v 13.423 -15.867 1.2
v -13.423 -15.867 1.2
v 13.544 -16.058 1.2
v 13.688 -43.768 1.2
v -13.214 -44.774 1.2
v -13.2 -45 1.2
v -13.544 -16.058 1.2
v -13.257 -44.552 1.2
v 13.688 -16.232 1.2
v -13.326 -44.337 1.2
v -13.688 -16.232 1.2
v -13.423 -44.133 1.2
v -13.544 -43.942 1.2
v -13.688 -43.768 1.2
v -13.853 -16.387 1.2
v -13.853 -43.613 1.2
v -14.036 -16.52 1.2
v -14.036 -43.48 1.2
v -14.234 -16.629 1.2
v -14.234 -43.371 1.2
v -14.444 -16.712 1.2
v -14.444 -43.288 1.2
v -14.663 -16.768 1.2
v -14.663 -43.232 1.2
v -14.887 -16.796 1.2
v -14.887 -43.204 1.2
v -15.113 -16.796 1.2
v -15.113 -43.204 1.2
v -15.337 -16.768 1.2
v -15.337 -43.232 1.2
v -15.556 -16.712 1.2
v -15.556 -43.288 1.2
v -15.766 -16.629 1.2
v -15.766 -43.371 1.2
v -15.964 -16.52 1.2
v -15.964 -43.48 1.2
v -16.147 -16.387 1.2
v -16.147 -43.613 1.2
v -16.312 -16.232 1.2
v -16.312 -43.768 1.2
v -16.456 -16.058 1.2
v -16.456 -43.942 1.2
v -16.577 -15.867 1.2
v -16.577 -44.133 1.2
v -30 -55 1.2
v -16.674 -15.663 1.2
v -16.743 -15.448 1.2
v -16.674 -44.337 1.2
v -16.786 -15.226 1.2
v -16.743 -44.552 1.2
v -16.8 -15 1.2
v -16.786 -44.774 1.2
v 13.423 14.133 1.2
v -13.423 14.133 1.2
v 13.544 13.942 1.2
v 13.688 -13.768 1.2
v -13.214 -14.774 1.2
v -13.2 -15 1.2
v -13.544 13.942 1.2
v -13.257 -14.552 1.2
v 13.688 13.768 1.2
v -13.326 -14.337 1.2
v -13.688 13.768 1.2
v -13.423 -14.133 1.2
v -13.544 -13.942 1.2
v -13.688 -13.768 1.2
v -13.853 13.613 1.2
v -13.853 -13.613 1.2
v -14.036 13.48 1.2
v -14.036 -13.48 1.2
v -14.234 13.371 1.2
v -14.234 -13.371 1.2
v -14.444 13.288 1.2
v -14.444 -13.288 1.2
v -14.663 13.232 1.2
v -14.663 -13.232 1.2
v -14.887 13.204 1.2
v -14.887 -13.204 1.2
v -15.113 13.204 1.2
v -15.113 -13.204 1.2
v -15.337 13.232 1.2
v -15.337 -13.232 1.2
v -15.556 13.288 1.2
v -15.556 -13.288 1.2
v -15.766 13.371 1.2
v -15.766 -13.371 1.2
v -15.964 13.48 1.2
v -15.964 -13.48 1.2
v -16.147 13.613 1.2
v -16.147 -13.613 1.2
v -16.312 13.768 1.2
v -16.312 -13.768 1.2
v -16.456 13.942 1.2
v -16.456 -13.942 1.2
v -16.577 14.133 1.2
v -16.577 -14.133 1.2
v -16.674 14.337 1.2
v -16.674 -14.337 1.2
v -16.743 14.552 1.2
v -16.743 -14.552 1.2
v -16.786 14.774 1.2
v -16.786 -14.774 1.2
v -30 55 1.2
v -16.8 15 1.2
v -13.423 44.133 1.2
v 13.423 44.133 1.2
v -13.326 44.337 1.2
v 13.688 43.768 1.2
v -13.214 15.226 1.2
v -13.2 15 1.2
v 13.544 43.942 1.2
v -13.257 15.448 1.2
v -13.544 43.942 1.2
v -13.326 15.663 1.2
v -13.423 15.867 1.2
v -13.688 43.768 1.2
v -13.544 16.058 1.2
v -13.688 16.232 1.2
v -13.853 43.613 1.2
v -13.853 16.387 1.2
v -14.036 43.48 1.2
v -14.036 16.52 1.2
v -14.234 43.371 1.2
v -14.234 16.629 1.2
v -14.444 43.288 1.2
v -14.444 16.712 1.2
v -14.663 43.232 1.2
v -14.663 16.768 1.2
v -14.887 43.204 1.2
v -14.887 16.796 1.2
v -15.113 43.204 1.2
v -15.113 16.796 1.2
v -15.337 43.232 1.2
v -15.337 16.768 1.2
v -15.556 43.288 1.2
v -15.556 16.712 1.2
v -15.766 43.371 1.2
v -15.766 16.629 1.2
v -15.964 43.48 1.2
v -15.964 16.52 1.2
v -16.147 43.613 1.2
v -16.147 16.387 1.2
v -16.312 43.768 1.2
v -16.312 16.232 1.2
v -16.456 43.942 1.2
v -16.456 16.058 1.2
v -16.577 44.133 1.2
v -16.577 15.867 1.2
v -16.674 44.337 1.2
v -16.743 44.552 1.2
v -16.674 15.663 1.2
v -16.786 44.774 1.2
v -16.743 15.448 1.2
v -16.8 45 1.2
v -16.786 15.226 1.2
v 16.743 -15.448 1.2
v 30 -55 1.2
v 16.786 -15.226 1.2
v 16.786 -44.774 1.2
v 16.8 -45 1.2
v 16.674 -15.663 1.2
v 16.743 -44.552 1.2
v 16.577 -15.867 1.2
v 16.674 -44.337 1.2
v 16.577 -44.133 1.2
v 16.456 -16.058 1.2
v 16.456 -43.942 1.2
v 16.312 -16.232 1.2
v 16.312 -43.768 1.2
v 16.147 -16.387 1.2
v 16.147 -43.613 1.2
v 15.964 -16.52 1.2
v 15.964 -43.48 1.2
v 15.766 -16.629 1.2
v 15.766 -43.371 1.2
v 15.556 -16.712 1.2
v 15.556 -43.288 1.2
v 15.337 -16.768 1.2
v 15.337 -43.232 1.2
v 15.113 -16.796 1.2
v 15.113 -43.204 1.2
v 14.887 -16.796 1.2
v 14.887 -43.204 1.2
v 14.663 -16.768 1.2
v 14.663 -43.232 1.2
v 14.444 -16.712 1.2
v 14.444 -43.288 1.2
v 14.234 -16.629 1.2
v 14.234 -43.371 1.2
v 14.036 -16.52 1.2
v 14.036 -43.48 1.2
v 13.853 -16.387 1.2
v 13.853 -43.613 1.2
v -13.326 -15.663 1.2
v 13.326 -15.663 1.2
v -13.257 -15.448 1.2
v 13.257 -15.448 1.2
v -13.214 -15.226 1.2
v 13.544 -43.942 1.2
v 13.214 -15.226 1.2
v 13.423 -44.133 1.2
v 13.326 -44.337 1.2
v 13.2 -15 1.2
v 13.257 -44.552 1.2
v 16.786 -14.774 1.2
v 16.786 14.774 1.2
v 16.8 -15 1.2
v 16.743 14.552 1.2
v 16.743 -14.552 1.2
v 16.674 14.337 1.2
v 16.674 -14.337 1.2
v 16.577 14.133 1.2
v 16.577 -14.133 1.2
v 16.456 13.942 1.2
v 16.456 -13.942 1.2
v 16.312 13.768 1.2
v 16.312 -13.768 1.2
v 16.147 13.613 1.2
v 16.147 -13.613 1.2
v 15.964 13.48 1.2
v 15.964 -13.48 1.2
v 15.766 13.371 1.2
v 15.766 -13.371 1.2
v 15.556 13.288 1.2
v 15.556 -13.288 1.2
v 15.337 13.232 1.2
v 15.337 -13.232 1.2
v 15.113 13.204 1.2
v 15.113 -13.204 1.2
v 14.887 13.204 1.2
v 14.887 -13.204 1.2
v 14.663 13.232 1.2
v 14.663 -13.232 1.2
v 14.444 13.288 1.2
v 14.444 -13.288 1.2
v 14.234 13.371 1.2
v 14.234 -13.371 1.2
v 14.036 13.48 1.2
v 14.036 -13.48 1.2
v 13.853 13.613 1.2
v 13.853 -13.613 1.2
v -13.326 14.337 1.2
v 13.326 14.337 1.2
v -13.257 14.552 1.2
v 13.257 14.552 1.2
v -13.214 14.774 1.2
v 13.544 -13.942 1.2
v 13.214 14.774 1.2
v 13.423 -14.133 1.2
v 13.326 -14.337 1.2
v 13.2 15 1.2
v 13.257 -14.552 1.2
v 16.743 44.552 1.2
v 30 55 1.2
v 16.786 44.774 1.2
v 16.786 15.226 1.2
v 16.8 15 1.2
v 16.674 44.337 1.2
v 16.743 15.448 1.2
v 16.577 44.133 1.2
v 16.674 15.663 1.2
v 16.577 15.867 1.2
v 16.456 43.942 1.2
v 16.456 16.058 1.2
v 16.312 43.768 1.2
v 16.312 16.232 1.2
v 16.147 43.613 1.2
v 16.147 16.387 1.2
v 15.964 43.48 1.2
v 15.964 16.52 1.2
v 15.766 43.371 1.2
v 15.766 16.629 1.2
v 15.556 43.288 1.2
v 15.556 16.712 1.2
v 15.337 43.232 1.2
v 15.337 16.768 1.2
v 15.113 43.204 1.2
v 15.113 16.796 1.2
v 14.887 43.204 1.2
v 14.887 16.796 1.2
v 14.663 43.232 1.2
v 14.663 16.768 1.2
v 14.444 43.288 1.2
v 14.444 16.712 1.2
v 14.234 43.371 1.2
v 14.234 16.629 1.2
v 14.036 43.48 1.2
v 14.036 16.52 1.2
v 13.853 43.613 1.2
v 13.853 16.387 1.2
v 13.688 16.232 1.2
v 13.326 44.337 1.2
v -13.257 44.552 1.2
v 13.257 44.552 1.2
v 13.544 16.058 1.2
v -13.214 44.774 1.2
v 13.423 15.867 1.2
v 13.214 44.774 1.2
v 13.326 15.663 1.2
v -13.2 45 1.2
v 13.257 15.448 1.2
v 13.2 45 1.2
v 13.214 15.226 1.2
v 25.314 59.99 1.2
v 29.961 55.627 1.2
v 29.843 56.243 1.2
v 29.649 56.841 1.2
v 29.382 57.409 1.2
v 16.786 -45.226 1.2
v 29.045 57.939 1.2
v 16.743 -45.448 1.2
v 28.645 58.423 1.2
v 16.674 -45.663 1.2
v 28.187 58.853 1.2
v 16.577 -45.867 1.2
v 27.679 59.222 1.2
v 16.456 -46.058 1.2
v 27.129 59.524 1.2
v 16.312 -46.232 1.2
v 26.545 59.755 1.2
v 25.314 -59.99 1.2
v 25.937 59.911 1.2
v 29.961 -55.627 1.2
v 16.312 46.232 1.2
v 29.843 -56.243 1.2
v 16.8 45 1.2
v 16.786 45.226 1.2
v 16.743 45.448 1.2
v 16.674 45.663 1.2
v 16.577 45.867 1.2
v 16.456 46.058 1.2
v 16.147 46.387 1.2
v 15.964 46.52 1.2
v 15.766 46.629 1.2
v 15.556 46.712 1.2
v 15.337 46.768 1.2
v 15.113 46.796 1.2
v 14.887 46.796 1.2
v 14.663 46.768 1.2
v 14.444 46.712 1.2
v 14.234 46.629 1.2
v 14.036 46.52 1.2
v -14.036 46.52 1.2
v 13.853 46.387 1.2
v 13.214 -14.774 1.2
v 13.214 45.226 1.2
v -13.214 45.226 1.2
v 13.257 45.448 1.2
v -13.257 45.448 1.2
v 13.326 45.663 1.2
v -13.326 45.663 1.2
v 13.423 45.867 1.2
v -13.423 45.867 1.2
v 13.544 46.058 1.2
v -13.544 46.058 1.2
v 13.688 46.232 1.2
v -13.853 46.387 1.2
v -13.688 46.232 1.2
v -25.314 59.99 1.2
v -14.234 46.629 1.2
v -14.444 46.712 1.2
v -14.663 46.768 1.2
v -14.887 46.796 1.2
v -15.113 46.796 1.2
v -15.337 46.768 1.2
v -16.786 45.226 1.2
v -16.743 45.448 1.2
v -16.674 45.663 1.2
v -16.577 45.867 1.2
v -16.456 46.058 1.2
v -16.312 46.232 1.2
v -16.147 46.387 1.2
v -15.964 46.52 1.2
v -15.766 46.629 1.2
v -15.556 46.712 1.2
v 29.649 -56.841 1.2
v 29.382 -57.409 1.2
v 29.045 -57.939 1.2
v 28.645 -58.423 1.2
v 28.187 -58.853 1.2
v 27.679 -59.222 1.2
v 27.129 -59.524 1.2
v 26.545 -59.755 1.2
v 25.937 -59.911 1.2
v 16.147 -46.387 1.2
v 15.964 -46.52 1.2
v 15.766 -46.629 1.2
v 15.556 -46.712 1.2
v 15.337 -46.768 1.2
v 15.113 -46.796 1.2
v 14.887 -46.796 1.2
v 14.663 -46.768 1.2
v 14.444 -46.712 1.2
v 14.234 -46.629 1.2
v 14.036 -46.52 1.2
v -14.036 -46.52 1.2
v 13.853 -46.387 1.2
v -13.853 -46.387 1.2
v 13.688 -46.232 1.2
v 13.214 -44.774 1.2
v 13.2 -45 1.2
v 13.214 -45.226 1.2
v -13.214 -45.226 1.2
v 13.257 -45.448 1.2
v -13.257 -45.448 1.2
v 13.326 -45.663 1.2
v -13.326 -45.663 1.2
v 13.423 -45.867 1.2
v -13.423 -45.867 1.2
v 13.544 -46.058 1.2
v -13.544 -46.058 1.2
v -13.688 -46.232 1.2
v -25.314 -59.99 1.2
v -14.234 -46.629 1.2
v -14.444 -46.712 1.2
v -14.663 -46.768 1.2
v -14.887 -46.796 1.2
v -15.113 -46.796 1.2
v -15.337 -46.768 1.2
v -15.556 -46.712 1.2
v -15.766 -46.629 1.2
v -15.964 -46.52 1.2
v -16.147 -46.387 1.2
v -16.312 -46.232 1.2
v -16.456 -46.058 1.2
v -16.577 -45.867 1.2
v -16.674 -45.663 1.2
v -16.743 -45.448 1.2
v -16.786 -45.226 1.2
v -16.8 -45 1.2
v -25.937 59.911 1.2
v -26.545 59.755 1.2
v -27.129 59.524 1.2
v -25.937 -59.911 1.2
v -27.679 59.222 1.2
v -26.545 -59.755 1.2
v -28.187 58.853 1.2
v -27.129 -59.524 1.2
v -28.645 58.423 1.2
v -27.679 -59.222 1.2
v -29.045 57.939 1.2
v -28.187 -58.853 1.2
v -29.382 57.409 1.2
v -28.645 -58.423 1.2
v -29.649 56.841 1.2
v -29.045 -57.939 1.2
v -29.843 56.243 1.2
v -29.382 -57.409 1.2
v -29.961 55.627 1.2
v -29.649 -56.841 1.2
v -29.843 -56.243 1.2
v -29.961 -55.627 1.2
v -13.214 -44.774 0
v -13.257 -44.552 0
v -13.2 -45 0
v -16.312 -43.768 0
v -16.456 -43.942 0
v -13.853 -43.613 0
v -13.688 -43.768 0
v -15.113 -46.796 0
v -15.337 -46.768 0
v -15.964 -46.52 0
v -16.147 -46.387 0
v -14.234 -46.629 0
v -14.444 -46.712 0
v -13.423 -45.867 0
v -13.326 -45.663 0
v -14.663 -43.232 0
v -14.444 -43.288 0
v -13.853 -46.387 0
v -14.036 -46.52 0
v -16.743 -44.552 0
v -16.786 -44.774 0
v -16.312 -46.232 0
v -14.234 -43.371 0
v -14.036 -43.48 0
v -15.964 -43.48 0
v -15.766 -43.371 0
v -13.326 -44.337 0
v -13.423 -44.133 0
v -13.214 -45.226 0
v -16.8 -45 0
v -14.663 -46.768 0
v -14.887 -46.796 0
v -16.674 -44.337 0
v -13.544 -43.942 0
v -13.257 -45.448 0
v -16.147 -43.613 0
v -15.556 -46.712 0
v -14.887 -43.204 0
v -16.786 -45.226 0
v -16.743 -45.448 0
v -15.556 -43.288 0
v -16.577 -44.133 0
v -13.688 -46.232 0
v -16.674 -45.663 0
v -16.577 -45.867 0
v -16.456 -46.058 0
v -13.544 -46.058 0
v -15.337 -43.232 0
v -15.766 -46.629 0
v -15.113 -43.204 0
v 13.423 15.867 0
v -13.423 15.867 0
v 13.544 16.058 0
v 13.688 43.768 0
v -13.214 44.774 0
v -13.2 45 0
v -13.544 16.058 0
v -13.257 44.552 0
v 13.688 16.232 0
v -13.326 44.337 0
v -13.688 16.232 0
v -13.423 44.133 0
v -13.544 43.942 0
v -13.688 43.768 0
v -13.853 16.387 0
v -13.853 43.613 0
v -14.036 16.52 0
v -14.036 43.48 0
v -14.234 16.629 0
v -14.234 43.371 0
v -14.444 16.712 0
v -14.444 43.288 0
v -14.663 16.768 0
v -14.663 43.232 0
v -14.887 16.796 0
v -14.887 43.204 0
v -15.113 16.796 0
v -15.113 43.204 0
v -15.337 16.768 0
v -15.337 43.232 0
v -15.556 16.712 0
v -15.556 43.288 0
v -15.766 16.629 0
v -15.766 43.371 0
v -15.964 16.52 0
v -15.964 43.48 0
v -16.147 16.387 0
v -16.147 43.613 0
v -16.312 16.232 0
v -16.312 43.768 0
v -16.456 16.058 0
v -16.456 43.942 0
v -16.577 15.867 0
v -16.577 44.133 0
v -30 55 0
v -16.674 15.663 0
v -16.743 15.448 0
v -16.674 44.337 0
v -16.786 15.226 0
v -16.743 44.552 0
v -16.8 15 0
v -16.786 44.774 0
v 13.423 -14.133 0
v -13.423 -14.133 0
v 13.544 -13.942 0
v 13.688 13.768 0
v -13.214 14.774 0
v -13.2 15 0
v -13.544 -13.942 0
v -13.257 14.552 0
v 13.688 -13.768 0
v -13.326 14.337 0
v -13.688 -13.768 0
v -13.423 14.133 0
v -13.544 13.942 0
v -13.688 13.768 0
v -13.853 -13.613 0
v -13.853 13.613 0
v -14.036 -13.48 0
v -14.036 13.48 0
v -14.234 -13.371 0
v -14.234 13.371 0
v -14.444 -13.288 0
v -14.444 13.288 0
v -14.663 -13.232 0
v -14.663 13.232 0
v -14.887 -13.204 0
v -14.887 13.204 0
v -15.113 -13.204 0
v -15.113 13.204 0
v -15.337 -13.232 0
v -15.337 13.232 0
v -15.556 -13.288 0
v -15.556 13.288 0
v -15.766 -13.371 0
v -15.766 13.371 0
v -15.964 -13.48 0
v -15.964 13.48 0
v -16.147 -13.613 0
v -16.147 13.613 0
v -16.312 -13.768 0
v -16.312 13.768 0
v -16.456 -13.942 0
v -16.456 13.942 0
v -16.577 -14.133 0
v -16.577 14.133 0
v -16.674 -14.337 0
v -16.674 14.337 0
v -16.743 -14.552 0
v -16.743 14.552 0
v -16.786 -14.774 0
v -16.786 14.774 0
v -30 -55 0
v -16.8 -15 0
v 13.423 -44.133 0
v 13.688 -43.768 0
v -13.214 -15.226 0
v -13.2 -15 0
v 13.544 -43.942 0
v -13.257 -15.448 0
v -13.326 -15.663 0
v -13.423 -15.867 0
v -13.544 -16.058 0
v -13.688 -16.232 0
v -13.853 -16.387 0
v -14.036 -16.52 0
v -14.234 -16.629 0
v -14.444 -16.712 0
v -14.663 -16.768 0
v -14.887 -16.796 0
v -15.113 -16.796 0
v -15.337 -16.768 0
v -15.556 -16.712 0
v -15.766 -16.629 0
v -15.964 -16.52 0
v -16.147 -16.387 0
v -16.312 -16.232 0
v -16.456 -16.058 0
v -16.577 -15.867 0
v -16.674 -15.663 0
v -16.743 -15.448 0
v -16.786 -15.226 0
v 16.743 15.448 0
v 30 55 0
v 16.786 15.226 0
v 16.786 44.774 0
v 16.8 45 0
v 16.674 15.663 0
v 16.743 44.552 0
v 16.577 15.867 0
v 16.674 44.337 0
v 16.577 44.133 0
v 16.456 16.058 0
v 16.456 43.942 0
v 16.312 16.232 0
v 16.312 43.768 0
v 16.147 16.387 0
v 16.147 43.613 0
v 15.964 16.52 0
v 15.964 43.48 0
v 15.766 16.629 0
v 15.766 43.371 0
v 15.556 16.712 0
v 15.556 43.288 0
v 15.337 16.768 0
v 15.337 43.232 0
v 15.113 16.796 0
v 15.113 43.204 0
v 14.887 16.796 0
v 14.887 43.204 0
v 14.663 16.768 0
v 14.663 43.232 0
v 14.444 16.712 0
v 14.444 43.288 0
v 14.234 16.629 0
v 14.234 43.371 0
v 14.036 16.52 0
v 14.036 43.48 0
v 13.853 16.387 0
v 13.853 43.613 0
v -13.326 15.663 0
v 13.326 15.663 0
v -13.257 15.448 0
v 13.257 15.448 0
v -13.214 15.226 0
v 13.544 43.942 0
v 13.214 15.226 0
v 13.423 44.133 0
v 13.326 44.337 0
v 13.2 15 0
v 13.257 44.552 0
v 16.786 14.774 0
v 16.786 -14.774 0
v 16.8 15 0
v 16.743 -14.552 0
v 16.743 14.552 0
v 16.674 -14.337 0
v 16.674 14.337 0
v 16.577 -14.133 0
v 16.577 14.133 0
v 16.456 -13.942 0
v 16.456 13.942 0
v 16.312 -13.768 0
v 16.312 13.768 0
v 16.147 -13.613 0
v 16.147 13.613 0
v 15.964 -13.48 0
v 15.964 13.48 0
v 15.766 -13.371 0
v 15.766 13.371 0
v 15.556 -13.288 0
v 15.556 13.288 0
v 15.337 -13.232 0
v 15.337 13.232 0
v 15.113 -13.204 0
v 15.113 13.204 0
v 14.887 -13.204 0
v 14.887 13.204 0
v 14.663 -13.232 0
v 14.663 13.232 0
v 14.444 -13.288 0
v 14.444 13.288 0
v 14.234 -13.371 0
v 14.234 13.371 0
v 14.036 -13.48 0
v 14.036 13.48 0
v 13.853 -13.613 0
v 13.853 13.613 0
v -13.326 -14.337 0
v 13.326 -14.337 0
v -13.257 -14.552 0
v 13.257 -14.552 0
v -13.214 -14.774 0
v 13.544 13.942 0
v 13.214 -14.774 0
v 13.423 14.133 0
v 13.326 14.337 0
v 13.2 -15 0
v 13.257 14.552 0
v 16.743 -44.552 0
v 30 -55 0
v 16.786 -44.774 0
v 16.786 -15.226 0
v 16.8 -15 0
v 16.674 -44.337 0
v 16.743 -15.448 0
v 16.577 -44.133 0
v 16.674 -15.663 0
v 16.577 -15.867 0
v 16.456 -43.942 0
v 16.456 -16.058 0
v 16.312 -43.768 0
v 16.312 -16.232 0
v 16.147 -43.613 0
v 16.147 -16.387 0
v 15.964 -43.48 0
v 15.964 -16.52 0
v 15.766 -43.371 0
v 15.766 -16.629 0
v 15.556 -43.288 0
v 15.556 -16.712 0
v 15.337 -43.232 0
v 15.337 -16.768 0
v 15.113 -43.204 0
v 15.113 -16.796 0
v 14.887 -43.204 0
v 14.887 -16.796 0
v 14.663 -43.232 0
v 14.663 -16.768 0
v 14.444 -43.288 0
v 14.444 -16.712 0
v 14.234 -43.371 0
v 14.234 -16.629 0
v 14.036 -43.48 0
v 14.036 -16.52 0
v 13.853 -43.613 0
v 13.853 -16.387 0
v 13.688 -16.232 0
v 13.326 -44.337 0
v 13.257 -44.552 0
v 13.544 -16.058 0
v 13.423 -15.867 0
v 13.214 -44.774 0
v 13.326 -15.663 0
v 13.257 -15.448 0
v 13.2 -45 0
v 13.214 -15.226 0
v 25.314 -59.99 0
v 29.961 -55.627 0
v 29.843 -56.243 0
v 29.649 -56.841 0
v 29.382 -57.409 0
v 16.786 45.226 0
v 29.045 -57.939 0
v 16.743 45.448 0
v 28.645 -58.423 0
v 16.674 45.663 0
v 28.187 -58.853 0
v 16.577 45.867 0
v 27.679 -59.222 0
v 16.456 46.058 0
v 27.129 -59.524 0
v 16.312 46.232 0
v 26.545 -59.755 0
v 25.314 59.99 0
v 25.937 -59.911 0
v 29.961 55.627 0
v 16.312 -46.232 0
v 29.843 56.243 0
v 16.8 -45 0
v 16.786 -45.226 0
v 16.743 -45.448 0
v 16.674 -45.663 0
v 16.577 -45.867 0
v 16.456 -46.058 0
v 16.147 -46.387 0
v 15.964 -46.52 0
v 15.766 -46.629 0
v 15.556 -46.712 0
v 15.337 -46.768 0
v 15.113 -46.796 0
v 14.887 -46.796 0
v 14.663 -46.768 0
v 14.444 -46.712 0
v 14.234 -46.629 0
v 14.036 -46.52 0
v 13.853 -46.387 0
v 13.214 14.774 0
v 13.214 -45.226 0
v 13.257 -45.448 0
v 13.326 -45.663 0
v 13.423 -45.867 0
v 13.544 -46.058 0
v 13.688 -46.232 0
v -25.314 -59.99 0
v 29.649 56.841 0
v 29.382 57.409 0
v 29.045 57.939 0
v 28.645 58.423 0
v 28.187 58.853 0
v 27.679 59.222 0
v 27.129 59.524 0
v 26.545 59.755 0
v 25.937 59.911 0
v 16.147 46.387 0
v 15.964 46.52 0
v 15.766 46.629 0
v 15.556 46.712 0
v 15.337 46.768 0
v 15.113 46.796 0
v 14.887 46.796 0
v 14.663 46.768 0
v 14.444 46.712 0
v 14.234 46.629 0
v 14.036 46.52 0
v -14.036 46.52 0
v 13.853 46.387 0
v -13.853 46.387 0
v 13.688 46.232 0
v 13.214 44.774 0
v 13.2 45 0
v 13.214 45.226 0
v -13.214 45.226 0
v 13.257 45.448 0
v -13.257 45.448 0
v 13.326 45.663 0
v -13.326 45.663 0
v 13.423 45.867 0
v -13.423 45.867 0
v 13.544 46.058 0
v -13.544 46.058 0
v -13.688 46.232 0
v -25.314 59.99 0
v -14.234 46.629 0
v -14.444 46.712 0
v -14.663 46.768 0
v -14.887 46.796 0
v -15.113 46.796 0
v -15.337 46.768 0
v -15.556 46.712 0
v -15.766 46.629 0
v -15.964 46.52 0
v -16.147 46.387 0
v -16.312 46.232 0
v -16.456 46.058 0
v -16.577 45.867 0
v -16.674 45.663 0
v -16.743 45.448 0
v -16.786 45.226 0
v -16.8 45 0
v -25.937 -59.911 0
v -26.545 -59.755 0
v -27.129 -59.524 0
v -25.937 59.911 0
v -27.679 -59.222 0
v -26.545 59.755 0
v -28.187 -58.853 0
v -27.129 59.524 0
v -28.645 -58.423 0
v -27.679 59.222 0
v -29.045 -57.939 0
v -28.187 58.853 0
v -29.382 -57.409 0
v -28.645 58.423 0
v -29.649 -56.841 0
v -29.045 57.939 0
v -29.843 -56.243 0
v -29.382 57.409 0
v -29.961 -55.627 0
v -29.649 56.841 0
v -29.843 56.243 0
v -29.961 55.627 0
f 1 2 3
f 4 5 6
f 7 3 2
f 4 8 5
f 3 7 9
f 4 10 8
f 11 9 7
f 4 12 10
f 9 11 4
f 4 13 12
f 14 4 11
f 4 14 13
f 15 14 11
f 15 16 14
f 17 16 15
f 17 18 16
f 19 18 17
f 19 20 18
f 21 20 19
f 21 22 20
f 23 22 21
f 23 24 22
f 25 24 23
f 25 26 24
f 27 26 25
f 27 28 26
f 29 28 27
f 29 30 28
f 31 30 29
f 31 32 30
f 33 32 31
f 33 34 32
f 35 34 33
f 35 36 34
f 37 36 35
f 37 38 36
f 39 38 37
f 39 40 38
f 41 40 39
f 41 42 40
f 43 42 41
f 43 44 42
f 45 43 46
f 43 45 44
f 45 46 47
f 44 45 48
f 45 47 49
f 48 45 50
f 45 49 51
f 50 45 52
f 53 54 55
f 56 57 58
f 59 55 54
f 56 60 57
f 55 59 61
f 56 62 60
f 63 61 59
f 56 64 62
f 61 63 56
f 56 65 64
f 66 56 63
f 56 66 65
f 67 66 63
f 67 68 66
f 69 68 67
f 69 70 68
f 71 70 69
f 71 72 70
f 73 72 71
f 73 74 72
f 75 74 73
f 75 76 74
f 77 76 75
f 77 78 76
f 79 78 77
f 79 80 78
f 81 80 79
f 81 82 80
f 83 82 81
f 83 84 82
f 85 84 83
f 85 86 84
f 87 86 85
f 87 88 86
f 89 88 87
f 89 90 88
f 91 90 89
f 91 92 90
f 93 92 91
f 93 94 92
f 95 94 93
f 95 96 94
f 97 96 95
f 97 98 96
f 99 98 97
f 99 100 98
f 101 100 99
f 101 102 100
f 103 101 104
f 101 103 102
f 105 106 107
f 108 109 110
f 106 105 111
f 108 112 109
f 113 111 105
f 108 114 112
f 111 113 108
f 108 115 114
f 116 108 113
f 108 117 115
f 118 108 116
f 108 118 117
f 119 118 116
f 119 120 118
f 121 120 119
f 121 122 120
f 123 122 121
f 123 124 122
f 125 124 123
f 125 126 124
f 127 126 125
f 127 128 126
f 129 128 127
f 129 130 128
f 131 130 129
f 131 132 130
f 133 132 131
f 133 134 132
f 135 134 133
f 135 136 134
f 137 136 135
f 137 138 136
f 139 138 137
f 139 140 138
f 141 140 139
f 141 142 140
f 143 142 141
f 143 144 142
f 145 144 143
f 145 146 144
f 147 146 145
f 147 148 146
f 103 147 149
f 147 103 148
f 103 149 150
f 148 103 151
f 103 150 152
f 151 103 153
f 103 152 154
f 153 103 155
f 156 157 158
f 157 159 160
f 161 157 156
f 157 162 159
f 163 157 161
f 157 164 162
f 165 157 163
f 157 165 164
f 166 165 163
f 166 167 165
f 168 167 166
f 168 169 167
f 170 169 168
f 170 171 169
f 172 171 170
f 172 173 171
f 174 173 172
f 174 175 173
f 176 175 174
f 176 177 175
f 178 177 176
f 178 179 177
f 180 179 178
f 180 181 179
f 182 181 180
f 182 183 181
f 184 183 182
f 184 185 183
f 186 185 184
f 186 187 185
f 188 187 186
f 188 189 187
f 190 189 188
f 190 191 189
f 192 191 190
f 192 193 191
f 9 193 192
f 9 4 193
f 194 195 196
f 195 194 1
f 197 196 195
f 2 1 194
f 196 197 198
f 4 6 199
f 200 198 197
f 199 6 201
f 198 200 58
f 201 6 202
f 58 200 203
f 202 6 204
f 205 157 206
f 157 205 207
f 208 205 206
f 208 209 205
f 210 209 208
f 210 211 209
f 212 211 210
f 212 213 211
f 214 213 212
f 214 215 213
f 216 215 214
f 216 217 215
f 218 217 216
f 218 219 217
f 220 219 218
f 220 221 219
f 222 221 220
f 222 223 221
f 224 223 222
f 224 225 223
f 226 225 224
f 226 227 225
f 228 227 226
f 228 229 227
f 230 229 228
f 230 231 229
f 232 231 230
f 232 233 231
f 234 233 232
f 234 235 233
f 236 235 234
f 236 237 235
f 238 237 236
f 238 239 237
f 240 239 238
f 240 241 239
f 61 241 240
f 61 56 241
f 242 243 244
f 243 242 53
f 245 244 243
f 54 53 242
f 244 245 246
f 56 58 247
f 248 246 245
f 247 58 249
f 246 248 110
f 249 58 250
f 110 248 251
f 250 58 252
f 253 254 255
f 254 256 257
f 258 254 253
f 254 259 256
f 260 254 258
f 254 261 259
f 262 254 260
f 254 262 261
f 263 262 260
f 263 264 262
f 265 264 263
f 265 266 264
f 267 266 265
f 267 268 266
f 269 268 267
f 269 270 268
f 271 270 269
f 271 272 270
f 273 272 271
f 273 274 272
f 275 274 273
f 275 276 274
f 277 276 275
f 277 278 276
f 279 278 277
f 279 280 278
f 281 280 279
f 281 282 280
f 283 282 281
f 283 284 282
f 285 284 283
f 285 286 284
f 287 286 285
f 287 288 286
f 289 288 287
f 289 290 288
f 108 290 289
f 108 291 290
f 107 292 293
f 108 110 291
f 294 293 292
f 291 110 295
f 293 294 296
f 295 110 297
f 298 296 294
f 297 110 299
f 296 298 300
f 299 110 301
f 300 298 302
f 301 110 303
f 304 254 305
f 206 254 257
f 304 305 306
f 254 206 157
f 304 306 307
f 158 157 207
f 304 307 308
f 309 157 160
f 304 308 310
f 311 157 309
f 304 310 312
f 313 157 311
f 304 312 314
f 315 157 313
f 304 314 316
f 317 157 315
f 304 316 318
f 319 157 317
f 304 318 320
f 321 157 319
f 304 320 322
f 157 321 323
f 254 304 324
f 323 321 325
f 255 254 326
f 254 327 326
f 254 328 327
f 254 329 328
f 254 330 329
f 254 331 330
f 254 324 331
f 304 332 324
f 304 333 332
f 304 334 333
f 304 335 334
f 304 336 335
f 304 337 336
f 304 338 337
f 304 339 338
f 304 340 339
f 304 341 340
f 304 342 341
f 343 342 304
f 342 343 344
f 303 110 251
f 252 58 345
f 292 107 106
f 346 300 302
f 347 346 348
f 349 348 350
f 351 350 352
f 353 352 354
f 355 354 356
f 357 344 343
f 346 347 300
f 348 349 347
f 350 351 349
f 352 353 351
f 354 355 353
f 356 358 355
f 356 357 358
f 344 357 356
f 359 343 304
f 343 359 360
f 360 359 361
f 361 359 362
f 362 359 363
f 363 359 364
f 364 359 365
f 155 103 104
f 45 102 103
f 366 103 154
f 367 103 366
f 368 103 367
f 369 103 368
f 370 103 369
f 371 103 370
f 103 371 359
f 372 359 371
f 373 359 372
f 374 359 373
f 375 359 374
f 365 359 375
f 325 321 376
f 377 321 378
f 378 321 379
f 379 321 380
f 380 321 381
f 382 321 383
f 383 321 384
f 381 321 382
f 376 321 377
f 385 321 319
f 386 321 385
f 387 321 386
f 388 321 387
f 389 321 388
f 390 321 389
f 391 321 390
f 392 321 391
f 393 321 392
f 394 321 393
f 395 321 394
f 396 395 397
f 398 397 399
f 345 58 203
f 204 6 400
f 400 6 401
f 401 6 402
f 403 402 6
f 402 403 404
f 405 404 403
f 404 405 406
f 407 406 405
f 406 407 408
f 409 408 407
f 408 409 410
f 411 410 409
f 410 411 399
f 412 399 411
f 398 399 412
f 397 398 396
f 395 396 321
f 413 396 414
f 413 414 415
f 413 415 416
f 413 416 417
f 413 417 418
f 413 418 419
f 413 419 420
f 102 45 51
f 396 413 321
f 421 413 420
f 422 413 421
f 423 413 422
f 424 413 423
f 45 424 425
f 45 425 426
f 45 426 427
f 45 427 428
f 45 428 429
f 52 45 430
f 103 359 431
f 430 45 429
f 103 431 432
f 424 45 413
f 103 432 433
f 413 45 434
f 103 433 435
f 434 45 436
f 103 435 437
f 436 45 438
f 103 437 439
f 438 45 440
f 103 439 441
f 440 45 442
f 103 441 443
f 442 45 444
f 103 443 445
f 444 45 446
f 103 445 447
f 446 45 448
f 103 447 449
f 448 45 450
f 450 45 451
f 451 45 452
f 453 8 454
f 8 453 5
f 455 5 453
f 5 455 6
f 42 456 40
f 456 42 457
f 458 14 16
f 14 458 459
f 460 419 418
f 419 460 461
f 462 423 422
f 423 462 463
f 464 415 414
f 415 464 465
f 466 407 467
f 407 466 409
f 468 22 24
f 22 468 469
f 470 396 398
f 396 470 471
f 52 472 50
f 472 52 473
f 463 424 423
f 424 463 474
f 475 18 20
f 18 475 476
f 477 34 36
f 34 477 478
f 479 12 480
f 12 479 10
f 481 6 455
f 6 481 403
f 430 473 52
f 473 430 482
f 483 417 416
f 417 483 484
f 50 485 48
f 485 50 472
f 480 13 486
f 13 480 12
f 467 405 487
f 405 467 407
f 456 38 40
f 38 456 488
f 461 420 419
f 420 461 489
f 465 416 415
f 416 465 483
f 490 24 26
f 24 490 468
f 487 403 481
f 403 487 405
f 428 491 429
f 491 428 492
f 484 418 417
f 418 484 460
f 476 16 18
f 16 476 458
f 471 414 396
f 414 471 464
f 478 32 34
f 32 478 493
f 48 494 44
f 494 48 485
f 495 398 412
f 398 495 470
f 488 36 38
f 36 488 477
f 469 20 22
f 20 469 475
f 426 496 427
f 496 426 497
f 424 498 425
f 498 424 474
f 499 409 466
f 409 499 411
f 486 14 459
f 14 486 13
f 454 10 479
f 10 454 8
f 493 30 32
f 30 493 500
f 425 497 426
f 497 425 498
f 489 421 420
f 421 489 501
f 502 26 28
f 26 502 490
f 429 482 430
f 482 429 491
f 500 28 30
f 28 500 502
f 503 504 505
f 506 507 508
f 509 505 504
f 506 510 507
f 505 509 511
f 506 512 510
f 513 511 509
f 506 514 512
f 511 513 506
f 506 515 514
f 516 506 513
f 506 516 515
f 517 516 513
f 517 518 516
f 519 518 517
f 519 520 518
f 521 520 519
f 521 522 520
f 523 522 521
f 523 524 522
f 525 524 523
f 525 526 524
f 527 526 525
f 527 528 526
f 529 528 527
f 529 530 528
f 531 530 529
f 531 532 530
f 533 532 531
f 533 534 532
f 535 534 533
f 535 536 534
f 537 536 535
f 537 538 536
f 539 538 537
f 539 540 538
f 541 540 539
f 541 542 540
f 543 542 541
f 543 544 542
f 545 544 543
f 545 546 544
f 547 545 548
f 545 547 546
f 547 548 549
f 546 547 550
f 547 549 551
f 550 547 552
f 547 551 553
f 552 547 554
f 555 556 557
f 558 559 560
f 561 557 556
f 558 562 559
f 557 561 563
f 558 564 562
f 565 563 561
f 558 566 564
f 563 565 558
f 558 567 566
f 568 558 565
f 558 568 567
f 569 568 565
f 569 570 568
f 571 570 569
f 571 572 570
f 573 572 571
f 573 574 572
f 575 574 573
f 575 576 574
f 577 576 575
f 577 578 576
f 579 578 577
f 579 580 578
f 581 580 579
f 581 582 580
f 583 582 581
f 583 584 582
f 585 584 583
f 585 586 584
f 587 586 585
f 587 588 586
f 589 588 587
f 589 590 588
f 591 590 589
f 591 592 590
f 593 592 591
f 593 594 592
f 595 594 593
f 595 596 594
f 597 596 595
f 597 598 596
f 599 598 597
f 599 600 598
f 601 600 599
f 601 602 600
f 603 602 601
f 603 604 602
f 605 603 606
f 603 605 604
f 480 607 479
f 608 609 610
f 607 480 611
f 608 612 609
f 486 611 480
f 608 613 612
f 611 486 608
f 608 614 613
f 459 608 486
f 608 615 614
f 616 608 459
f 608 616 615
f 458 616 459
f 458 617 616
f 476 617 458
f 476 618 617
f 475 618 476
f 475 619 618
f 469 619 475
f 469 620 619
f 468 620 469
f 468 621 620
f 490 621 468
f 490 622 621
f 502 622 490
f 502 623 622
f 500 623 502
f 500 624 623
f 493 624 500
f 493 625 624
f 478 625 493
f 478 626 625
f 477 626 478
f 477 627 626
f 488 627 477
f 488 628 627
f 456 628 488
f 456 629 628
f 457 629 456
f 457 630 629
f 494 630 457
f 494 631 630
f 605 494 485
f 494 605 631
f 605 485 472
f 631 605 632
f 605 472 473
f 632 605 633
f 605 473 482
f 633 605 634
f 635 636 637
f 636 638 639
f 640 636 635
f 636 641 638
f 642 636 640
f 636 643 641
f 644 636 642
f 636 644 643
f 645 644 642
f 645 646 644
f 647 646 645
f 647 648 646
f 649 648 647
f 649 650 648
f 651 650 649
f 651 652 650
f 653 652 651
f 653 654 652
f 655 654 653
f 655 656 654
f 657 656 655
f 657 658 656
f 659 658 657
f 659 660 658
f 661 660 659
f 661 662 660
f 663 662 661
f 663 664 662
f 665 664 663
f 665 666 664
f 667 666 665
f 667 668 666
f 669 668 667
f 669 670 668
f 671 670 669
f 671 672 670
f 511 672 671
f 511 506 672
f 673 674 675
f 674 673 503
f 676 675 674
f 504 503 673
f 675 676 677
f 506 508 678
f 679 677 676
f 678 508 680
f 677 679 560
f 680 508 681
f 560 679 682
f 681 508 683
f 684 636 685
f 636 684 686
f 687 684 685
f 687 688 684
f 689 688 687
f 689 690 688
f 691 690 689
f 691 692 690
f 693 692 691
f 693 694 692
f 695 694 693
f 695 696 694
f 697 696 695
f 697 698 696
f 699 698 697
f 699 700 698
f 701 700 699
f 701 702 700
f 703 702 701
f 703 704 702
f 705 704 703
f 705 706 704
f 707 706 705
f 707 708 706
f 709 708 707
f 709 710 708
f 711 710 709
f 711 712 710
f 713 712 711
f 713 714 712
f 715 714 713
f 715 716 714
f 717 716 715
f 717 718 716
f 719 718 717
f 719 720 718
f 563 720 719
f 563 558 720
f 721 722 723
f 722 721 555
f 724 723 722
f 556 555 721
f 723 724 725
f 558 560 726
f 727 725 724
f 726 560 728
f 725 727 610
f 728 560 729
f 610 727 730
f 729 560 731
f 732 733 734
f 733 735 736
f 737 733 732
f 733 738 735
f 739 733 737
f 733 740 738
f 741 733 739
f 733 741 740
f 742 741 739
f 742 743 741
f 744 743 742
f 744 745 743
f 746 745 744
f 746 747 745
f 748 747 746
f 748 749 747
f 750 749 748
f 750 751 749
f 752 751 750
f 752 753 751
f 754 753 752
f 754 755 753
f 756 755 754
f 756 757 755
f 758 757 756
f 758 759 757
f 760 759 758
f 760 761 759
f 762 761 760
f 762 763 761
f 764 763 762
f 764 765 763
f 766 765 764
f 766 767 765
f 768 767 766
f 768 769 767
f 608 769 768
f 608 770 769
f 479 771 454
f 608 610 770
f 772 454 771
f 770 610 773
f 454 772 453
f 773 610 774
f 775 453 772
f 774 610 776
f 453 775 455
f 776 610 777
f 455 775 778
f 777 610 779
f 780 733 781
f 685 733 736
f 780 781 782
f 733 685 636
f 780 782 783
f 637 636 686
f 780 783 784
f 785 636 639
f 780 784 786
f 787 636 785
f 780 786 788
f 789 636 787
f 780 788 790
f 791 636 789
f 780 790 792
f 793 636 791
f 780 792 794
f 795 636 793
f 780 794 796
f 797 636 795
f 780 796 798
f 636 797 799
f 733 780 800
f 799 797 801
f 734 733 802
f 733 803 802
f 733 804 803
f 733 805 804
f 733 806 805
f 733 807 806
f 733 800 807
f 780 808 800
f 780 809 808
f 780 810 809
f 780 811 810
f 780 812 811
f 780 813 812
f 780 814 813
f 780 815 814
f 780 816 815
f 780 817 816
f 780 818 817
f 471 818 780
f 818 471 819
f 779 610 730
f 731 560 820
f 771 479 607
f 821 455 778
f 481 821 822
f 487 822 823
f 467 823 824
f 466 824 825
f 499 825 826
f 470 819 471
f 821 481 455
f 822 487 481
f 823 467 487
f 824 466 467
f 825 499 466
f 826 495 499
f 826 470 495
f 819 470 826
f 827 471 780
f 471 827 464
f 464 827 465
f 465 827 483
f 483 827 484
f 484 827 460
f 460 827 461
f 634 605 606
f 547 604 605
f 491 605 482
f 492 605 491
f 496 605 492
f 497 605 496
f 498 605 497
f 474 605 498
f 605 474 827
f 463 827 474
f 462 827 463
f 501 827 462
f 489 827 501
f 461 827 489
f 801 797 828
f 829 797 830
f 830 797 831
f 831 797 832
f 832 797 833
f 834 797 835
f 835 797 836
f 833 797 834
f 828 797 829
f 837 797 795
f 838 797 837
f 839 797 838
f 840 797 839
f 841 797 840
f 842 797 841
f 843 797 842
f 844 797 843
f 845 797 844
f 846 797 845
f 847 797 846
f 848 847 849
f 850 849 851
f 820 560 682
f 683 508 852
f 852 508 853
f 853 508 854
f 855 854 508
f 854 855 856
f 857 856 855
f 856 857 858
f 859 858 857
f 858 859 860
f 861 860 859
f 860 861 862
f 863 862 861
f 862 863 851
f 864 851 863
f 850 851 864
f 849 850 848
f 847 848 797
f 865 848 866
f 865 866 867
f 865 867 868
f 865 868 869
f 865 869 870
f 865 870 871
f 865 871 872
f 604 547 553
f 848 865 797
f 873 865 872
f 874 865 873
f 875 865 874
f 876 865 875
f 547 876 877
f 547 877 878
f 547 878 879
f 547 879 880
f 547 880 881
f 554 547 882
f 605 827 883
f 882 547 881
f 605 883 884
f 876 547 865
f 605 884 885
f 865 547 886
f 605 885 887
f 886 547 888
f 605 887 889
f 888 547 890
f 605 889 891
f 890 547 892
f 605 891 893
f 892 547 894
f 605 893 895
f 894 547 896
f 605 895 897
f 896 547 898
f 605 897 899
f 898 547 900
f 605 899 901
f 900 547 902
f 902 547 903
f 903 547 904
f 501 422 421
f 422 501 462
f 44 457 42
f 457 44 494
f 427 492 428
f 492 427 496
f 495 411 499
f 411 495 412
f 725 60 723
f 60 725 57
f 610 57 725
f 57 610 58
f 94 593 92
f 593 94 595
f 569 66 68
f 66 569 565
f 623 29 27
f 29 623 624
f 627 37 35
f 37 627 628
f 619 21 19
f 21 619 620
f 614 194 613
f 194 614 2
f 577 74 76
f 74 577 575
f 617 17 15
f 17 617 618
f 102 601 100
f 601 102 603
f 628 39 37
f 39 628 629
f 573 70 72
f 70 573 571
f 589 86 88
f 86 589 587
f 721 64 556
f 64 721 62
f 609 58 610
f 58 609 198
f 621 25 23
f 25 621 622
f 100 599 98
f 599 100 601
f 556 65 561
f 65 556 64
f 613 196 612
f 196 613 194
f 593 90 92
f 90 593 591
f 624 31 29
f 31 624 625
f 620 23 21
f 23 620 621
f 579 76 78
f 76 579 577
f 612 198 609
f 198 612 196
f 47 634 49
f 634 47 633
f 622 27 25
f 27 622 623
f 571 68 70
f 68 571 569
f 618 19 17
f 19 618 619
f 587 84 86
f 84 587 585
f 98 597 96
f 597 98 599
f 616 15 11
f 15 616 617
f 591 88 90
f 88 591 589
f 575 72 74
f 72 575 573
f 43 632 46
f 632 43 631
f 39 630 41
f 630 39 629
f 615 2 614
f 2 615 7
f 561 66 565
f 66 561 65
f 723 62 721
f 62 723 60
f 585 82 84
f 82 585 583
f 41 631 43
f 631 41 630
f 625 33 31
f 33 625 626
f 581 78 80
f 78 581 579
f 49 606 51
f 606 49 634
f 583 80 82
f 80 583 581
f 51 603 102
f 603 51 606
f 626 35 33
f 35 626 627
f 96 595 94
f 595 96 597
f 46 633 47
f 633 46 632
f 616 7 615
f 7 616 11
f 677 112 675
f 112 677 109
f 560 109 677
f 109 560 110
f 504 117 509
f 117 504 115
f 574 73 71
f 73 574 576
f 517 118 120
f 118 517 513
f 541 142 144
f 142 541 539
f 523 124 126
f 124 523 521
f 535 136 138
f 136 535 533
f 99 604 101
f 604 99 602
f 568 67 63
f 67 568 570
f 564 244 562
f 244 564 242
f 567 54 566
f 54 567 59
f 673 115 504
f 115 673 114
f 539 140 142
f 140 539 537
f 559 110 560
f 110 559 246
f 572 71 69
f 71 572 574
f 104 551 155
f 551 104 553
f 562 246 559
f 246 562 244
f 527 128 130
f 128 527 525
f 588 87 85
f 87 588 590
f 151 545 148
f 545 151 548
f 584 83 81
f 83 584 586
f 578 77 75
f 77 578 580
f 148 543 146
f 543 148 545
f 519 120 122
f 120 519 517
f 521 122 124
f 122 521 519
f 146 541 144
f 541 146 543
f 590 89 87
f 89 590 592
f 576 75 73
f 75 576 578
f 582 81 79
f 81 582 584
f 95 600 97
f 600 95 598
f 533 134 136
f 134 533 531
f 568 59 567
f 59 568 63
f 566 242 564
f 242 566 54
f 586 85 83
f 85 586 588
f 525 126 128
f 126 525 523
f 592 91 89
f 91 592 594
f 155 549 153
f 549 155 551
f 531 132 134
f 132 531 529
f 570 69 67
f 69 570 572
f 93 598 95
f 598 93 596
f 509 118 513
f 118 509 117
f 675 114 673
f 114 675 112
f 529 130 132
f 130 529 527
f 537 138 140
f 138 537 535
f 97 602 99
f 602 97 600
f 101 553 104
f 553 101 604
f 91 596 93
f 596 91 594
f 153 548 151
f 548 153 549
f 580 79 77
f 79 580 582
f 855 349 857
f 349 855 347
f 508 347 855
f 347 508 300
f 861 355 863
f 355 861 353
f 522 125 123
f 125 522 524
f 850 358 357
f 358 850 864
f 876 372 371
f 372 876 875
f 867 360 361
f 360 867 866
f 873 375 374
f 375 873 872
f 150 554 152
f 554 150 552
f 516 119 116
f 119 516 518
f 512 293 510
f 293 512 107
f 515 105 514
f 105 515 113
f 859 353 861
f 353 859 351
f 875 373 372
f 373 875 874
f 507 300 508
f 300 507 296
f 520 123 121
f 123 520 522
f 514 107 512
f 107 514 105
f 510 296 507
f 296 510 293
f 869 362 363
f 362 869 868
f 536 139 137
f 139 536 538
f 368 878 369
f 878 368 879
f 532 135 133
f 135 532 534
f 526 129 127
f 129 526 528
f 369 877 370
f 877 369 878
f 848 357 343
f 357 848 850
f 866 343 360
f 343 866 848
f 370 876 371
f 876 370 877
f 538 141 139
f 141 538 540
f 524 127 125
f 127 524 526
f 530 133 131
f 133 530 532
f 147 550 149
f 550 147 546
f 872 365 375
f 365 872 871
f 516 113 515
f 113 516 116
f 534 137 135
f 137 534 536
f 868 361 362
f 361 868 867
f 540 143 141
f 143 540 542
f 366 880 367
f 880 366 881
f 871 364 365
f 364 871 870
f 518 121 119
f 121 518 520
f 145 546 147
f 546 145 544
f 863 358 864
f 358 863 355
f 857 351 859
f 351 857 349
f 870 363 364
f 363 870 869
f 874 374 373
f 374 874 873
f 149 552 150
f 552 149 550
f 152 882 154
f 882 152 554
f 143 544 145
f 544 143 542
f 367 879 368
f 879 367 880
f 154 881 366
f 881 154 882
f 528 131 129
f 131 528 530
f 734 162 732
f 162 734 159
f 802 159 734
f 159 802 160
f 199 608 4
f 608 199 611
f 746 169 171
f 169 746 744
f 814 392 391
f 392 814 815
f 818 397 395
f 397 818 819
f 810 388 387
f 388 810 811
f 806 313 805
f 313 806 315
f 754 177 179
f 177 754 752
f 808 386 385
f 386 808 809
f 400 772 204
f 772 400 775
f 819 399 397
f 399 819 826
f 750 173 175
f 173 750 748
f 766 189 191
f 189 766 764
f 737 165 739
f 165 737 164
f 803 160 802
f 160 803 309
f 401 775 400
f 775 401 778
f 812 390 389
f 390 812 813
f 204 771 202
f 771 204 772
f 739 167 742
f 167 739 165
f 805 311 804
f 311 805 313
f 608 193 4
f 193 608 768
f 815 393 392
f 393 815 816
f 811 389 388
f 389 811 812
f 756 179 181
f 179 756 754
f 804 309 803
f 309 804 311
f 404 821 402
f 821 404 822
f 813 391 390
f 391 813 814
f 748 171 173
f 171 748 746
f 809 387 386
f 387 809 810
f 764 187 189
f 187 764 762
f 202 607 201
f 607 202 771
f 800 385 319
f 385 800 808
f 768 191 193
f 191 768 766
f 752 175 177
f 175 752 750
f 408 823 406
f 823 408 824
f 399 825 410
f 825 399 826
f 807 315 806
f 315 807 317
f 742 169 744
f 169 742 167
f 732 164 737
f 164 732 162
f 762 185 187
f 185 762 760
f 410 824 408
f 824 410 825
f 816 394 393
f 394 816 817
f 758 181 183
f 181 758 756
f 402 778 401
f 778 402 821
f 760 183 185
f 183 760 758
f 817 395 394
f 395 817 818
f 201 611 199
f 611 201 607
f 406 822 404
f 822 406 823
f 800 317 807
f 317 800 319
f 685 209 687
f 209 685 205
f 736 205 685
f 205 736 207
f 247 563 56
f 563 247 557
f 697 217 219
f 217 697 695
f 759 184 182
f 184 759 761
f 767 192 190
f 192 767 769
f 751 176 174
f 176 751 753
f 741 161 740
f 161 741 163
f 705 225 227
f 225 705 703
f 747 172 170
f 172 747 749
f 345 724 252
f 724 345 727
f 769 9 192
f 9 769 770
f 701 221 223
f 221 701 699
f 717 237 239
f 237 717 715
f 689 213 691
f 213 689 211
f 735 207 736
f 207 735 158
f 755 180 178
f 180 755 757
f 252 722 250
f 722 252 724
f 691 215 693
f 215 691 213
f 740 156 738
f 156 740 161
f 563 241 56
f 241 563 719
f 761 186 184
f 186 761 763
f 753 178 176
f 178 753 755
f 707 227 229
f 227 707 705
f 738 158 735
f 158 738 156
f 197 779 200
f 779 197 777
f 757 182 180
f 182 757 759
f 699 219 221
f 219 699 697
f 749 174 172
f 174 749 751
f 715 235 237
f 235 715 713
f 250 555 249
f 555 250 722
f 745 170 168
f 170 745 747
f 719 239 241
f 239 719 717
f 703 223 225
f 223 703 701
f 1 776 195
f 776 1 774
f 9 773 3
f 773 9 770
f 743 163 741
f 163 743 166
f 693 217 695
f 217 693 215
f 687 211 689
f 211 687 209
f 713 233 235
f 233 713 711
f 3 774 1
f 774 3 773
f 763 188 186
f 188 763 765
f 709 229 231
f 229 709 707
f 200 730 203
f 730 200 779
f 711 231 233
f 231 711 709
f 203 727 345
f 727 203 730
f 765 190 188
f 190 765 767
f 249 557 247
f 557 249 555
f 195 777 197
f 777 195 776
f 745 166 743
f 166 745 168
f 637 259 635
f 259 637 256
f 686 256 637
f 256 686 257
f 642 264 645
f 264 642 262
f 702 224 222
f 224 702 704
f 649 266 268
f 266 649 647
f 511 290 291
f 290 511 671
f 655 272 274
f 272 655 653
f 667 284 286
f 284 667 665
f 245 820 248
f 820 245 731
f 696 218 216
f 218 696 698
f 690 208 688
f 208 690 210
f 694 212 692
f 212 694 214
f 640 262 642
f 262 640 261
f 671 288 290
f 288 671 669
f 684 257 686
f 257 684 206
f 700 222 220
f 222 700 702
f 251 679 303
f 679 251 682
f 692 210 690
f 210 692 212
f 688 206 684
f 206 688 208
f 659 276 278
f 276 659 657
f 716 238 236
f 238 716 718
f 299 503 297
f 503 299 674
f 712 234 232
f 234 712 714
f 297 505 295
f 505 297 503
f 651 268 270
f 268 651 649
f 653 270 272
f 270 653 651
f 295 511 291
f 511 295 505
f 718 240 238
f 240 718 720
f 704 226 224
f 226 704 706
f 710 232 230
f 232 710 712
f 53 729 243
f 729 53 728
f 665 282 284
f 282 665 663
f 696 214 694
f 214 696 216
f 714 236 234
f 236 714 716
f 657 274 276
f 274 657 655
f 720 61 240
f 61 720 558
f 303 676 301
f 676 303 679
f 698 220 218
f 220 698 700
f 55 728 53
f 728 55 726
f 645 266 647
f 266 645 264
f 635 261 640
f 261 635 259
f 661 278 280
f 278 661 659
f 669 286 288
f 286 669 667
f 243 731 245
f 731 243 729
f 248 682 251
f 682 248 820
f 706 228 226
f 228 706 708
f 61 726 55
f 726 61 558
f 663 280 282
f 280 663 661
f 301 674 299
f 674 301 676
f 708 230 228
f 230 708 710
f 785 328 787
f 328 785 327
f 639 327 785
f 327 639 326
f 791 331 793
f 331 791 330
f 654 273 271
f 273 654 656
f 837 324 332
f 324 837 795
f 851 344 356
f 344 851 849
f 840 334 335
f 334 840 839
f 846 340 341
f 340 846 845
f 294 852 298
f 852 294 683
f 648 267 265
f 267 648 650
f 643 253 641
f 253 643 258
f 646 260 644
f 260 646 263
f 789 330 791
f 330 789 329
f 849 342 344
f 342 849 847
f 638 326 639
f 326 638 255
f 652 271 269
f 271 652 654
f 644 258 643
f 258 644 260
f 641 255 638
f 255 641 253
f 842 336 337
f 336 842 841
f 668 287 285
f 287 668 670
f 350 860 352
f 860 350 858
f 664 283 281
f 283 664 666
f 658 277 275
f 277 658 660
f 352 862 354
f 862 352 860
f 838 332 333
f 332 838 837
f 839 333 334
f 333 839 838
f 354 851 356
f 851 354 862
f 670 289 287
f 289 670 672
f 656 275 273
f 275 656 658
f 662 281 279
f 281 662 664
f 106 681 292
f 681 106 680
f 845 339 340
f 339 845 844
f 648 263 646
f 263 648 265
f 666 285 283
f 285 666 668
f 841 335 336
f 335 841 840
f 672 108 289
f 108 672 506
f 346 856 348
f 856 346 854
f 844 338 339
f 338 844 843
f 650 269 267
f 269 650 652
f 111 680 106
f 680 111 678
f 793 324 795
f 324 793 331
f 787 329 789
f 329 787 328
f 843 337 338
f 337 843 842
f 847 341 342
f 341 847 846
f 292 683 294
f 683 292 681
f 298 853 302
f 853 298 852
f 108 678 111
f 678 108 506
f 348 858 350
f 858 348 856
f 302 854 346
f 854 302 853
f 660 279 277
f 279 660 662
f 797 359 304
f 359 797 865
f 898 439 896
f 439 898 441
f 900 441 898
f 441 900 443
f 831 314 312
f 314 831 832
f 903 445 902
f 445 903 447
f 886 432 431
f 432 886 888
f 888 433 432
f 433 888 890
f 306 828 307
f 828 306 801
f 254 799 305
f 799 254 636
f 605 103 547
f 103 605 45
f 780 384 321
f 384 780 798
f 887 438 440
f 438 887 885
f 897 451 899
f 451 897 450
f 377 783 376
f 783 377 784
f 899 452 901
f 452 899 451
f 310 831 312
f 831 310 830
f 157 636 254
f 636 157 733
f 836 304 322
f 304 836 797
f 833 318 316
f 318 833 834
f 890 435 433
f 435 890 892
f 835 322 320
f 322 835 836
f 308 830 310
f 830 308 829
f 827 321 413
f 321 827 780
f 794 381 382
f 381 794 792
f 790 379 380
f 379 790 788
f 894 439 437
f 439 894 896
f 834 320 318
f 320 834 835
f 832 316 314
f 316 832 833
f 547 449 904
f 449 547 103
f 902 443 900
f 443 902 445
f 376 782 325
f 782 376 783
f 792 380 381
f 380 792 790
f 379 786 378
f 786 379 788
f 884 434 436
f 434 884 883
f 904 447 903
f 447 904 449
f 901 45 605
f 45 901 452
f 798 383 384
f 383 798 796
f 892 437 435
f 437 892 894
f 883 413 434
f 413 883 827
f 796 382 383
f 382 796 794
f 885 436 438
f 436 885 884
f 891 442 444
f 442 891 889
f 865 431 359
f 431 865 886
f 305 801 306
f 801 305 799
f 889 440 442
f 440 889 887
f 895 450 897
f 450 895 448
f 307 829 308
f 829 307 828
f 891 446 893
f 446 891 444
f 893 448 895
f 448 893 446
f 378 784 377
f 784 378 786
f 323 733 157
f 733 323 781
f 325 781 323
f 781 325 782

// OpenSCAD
$fn = 50;


difference() {
	union() {
		hull() {
			translate(v = [-25.0000000000, 55.0000000000, 0]) {
				cylinder(h = 9, r = 5);
			}
			translate(v = [25.0000000000, 55.0000000000, 0]) {
				cylinder(h = 9, r = 5);
			}
			translate(v = [-25.0000000000, -55.0000000000, 0]) {
				cylinder(h = 9, r = 5);
			}
			translate(v = [25.0000000000, -55.0000000000, 0]) {
				cylinder(h = 9, r = 5);
			}
		}
	}
	union() {
		translate(v = [0, 0, 1.2000000000]) {
			hull() {
				translate(v = [-25.0000000000, 55.0000000000, 0]) {
					cylinder(h = 7.8000000000, r = 3.8000000000);
				}
				translate(v = [25.0000000000, 55.0000000000, 0]) {
					cylinder(h = 7.8000000000, r = 3.8000000000);
				}
				translate(v = [-25.0000000000, -55.0000000000, 0]) {
					cylinder(h = 7.8000000000, r = 3.8000000000);
				}
				translate(v = [25.0000000000, -55.0000000000, 0]) {
					cylinder(h = 7.8000000000, r = 3.8000000000);
				}
			}
		}
		#translate(v = [-15.0000000000, -45.0000000000, 0]) {
			cylinder(h = 1.2000000000, r = 1.8000000000);
		}
		#translate(v = [-15.0000000000, -15.0000000000, 0]) {
			cylinder(h = 1.2000000000, r = 1.8000000000);
		}
		#translate(v = [-15.0000000000, 15.0000000000, 0]) {
			cylinder(h = 1.2000000000, r = 1.8000000000);
		}
		#translate(v = [-15.0000000000, 45.0000000000, 0]) {
			cylinder(h = 1.2000000000, r = 1.8000000000);
		}
		#translate(v = [15.0000000000, -45.0000000000, 0]) {
			cylinder(h = 1.2000000000, r = 1.8000000000);
		}
		#translate(v = [15.0000000000, -15.0000000000, 0]) {
			cylinder(h = 1.2000000000, r = 1.8000000000);
		}
		#translate(v = [15.0000000000, 15.0000000000, 0]) {
			cylinder(h = 1.2000000000, r = 1.8000000000);
		}
		#translate(v = [15.0000000000, 45.0000000000, 0]) {
			cylinder(h = 1.2000000000, r = 1.8000000000);
		}
		translate(v = [-250.0000000000, -250.0000000000, 1.2000000000]) {
			cube(size = [500, 500, 500]);
		}
		translate(v = [-250.0000000000, -250.0000000000, 1.2000000000]) {
			cube(size = [500, 500, 500]);
		}
		translate(v = [-250.0000000000, -250.0000000000, 1.2000000000]) {
			cube(size = [500, 500, 500]);
		}
	}
}
